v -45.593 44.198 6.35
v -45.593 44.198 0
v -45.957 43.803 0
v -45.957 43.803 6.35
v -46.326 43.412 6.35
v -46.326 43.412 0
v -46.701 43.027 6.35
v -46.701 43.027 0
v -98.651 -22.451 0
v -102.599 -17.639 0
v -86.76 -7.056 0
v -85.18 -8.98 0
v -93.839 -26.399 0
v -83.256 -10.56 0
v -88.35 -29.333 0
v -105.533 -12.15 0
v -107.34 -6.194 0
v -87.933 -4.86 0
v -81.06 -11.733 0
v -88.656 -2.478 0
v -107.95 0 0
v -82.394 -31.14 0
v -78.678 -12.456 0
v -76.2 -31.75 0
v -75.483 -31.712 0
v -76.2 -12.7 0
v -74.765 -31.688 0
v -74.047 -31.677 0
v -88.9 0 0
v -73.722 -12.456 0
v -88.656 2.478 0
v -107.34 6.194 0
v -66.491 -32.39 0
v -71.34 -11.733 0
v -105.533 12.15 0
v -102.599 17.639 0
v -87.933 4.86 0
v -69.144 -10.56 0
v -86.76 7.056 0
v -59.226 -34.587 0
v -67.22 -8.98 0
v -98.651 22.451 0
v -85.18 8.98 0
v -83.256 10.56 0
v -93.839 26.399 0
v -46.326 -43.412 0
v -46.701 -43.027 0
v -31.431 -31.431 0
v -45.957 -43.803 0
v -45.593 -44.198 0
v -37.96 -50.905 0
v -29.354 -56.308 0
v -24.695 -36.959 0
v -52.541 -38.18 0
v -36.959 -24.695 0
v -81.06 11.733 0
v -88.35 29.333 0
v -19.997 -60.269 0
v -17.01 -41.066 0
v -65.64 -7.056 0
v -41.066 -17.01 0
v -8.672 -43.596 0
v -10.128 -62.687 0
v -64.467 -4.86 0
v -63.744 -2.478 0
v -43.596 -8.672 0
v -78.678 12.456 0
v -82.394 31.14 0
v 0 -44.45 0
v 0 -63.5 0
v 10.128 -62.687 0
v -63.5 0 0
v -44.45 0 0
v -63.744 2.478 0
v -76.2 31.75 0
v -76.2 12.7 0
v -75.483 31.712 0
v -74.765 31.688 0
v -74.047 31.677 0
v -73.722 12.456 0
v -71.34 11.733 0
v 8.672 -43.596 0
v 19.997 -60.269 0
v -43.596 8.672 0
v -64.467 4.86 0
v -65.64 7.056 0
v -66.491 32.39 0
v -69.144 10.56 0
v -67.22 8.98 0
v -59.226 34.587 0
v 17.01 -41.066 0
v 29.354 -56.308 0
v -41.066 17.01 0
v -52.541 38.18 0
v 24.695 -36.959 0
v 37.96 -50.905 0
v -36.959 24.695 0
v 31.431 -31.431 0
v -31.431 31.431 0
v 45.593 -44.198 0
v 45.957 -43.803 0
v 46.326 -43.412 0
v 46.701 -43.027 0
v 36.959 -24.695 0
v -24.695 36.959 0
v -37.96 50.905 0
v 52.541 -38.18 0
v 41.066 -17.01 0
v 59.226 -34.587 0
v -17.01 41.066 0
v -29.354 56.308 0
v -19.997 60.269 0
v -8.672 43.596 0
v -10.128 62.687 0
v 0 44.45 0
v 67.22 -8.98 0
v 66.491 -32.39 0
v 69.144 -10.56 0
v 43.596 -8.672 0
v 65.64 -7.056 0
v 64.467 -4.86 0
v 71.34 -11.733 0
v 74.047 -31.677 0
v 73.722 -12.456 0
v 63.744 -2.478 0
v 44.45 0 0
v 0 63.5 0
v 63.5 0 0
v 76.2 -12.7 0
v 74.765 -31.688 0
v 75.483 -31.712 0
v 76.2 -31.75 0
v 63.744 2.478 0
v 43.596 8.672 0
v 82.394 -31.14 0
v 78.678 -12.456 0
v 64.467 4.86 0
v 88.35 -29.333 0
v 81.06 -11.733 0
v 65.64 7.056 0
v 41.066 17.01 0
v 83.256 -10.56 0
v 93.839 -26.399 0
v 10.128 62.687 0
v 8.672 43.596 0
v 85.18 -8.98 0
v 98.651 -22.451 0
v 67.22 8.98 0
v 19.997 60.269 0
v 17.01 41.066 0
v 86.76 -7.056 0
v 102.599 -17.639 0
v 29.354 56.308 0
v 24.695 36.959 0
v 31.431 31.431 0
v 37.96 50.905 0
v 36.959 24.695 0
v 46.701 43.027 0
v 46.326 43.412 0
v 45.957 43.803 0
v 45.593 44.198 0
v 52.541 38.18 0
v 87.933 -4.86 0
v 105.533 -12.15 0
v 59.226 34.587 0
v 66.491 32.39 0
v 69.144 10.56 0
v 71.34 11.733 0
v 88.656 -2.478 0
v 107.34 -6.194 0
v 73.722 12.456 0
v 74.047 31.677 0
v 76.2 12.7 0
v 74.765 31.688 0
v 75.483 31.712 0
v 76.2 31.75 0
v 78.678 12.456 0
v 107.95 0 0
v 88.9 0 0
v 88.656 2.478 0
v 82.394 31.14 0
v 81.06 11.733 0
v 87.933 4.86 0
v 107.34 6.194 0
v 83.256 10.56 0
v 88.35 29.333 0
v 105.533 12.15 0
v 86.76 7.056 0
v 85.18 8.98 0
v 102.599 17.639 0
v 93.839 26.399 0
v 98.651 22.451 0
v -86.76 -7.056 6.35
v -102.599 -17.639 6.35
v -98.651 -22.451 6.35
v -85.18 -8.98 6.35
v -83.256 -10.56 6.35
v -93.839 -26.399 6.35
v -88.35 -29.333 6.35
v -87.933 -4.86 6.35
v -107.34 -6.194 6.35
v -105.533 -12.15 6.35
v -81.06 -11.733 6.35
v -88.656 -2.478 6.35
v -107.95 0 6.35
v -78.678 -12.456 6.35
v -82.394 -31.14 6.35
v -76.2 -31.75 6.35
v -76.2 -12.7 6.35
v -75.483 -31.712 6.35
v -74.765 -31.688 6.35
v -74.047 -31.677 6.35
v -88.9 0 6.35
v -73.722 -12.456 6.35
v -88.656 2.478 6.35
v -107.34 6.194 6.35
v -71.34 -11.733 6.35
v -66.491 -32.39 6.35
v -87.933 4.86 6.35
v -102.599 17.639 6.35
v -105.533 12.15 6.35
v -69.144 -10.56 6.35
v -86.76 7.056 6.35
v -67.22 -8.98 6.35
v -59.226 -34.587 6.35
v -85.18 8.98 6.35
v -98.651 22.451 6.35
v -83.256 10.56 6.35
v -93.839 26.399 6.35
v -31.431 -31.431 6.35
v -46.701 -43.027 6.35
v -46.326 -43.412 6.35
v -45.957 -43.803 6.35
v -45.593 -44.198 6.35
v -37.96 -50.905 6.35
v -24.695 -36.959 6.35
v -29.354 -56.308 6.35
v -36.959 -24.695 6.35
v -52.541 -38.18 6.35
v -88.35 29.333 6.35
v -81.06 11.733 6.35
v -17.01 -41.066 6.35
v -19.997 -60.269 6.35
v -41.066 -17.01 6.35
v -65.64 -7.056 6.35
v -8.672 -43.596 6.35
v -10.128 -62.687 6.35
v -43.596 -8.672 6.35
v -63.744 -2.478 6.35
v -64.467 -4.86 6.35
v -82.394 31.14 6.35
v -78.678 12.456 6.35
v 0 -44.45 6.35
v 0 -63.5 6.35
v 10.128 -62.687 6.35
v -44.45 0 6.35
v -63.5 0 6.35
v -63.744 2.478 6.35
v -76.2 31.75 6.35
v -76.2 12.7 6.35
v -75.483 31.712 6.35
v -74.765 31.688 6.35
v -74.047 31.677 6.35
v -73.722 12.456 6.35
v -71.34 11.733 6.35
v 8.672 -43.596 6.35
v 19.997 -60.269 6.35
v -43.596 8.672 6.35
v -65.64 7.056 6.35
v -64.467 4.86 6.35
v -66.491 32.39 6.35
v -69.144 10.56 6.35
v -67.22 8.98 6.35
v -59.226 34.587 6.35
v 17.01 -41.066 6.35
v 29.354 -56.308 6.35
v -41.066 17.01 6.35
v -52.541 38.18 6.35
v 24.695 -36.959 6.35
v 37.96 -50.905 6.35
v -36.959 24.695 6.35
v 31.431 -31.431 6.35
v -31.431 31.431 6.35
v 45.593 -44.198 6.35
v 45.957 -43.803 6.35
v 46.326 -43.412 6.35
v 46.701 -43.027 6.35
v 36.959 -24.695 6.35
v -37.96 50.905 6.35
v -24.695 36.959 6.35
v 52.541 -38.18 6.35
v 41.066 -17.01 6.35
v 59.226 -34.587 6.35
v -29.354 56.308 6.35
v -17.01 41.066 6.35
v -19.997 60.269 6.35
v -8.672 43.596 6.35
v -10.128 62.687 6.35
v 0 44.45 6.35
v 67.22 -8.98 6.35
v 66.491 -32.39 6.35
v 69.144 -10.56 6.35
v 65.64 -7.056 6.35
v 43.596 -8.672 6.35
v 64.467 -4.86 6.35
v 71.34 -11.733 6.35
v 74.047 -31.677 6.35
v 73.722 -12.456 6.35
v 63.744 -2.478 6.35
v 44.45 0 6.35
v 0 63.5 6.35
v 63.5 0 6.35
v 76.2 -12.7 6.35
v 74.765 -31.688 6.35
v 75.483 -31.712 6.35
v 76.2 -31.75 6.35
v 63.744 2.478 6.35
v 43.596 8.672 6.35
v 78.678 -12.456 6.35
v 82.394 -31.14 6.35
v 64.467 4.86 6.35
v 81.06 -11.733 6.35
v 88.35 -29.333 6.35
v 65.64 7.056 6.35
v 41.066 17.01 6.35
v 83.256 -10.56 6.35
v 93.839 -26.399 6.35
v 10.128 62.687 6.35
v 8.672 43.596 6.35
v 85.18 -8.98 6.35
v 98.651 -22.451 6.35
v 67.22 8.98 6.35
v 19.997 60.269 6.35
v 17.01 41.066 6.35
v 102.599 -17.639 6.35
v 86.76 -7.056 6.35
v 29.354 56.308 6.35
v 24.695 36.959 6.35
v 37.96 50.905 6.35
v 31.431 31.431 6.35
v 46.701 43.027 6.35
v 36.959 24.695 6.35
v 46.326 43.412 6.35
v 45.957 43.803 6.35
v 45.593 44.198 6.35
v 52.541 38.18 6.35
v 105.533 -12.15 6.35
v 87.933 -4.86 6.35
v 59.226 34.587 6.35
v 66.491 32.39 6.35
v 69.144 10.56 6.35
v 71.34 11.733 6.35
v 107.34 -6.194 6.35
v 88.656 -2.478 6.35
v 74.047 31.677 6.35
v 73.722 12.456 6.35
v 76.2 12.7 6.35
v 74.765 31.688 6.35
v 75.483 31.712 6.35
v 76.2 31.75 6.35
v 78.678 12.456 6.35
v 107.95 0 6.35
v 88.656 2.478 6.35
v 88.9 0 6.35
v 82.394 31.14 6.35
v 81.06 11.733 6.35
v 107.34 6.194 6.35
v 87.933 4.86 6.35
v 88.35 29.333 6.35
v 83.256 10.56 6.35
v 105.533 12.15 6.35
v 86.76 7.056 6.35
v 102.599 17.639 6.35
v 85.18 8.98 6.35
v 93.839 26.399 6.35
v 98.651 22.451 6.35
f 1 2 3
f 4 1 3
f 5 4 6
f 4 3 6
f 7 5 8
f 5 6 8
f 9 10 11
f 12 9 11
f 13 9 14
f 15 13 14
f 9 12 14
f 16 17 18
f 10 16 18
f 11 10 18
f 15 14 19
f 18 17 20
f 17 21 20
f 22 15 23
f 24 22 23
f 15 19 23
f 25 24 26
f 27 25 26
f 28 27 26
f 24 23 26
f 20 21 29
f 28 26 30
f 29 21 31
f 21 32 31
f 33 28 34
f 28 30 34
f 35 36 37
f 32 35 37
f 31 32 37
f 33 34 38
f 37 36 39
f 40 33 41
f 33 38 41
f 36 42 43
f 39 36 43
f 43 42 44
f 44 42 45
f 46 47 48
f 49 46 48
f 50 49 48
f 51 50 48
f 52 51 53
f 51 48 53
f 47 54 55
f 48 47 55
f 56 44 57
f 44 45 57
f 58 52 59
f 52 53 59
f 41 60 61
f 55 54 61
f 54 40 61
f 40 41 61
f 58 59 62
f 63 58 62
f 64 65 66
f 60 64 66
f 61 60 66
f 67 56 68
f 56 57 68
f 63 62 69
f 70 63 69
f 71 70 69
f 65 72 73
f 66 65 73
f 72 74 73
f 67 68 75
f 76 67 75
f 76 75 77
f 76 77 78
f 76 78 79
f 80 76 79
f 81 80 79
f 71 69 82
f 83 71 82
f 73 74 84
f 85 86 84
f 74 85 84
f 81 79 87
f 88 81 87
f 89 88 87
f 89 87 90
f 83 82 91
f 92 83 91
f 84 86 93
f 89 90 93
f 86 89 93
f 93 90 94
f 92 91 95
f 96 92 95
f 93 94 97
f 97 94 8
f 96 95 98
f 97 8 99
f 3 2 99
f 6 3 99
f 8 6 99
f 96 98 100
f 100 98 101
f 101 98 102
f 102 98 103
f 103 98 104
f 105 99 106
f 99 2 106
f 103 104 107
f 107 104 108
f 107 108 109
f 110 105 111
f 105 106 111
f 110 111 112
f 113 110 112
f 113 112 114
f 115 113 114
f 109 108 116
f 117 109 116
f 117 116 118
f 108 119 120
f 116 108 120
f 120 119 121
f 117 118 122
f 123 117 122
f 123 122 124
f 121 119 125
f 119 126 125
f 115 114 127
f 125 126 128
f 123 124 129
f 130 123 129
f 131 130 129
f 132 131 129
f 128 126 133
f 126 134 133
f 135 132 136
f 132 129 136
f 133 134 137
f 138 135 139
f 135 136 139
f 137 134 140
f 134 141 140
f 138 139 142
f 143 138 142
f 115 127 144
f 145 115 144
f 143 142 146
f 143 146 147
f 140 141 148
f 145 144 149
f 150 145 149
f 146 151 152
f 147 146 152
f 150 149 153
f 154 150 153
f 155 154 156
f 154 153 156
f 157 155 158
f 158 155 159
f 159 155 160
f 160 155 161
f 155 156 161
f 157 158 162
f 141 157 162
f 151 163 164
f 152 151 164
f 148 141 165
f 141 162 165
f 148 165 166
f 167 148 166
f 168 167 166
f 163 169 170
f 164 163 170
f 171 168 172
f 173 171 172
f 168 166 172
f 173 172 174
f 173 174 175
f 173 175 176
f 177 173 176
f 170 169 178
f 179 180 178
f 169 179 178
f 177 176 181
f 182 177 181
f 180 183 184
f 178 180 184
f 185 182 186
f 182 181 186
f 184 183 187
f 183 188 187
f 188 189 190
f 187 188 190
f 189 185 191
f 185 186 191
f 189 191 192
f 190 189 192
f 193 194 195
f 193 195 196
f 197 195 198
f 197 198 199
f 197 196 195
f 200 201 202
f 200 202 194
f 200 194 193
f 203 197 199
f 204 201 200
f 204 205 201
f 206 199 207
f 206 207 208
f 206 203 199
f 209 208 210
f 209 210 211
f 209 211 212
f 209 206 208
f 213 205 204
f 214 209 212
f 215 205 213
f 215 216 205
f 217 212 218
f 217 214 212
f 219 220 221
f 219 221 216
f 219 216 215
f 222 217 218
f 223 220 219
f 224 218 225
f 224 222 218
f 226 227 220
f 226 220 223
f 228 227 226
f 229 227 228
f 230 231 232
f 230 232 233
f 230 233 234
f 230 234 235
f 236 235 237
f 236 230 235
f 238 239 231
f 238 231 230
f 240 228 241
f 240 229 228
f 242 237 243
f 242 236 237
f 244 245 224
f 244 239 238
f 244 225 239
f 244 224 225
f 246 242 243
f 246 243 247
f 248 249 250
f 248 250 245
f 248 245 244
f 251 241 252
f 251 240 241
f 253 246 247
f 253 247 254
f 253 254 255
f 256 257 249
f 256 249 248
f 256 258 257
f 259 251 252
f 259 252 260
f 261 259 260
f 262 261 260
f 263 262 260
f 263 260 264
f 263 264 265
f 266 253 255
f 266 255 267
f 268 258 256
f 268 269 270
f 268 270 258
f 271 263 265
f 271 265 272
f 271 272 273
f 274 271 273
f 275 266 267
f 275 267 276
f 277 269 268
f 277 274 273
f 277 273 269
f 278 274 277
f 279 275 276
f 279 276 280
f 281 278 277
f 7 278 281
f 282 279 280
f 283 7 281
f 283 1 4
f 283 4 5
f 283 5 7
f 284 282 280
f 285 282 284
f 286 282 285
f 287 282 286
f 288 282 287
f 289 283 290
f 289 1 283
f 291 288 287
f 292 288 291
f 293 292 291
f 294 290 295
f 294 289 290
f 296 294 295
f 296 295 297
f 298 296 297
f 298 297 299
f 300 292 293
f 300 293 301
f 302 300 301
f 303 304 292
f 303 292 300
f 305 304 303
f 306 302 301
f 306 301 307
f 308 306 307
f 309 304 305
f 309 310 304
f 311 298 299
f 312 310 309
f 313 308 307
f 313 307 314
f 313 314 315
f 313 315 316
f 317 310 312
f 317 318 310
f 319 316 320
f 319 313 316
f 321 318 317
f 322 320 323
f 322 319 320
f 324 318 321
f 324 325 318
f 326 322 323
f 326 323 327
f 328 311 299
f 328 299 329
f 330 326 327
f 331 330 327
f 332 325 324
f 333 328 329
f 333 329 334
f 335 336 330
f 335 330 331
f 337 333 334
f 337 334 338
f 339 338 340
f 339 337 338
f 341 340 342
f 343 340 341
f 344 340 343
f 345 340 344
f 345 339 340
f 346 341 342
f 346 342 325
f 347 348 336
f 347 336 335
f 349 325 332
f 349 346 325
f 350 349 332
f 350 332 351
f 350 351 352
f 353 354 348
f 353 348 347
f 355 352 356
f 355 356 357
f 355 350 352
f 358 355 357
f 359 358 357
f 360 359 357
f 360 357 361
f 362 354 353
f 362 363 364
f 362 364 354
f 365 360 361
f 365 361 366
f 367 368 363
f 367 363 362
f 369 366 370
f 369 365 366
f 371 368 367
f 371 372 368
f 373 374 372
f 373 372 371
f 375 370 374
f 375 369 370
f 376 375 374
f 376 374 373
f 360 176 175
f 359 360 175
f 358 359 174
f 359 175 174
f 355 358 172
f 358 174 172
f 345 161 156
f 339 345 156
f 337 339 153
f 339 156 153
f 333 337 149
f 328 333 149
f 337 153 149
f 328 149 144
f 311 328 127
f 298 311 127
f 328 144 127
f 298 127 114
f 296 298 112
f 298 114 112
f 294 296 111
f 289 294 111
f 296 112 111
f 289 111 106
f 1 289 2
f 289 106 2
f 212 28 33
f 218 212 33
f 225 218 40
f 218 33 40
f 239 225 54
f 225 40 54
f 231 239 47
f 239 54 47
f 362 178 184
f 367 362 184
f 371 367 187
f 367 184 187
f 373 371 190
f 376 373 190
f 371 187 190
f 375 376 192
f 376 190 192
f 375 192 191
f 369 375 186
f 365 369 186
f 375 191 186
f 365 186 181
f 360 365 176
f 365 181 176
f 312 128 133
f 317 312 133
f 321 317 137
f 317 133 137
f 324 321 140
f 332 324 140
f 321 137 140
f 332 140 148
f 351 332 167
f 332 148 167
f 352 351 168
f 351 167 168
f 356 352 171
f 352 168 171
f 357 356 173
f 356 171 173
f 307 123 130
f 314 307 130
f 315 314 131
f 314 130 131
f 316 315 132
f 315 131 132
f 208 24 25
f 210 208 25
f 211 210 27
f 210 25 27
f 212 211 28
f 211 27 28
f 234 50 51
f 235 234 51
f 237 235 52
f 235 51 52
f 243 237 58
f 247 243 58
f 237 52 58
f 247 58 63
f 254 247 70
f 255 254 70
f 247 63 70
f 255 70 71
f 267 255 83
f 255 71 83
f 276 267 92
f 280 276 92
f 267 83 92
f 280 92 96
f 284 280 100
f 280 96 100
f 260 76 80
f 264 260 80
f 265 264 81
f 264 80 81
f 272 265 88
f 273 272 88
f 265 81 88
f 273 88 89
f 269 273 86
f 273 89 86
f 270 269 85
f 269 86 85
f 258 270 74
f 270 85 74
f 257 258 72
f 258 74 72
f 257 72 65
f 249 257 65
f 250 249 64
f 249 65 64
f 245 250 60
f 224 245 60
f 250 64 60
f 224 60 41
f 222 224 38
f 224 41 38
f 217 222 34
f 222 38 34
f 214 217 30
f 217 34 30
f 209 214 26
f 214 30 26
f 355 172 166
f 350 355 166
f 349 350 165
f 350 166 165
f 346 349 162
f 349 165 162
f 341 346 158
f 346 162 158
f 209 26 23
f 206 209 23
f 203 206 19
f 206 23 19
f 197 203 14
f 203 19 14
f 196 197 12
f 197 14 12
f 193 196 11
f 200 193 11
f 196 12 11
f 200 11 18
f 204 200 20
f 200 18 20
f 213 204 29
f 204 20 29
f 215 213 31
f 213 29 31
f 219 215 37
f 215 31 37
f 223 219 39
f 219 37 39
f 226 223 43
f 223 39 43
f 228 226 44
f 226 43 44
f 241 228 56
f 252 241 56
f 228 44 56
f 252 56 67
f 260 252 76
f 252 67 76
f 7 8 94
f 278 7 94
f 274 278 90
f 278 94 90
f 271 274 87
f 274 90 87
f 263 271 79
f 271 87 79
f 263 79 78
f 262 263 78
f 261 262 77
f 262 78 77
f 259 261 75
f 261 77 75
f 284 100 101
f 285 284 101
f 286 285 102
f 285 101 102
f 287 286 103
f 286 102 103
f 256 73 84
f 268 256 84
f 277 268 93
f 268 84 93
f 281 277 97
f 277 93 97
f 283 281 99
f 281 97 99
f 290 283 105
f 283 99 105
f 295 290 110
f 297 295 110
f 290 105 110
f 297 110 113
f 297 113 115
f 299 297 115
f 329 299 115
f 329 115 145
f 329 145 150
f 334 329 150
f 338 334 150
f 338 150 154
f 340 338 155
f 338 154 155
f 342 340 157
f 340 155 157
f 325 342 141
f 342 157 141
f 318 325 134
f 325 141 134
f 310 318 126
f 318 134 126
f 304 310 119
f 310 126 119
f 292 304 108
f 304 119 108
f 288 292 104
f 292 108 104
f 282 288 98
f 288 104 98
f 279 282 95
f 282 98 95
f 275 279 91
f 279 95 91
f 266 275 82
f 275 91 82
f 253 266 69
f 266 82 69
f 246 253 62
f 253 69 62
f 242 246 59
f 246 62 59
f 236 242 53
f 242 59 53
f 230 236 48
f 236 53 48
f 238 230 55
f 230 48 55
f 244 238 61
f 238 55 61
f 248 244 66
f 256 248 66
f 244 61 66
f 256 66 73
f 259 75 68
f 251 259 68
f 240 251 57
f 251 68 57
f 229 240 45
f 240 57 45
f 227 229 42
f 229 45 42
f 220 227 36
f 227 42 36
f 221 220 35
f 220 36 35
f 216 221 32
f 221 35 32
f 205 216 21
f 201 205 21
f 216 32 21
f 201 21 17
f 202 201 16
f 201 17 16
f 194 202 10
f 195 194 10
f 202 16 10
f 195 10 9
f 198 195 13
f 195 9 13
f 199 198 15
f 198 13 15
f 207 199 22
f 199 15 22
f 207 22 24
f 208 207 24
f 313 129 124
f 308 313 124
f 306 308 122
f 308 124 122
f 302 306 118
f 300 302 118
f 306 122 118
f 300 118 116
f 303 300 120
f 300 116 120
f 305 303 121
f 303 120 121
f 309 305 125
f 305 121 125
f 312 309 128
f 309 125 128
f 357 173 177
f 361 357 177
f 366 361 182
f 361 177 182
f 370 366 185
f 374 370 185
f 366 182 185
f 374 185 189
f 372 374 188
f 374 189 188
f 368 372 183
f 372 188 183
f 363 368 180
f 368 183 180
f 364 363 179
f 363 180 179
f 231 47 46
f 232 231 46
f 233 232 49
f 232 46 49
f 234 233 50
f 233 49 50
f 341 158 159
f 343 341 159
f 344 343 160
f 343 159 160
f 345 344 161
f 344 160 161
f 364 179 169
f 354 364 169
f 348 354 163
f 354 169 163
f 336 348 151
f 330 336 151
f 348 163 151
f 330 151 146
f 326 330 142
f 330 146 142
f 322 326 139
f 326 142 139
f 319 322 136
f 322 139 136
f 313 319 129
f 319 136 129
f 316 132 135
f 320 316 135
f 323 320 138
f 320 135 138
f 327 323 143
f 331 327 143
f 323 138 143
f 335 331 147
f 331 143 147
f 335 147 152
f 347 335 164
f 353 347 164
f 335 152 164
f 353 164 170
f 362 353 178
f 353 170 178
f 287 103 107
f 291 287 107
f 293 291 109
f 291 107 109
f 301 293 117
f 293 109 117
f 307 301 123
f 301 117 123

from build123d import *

# Parameters (mm, degrees)
F1_DEPTH = 6.35


with BuildPart() as f1:
    # F0 (on Top) → F1 (new body)
    with BuildSketch(Plane.XY):
        with BuildLine():
            ThreePointArc((57.94375, -25.976370723), (48.024670033, -14.636026826), (44.45, 0))
            ThreePointArc((44.45, 0), (0, -44.45), (-44.45, 0))
            ThreePointArc((-44.45, 0), (-48.024670033, -14.636026826), (-57.94375, -25.976370723))
            ThreePointArc((-57.94375, -25.976370723), (-53.0122296555, -34.9564515783), (-46.7007710297, -43.0265962543))
            ThreePointArc((-46.7007710297, -43.0265962543), (-46.1408199964, -43.6066686624), (-45.5932687094, -44.1984597966))
            ThreePointArc((-45.5932687094, -44.1984597966), (0, -63.5), (45.5932687094, -44.1984597966))
            ThreePointArc((45.5932687094, -44.1984597966), (46.1408199964, -43.6066686624), (46.7007710297, -43.0265962543))
            ThreePointArc((46.7007710297, -43.0265962543), (53.0122296555, -34.9564515783), (57.94375, -25.976370723))
        make_face()
        with BuildLine():
            ThreePointArc((57.94375, 25.976370723), (48.024670033, 14.636026826), (44.45, 0))
            Line((44.45, 0), (63.5, 0))
            ThreePointArc((63.5, 0), (62.0954029096, 13.2819779212), (57.94375, 25.976370723))
        make_face()
        with BuildLine():
            ThreePointArc((-44.45, 0), (0, 44.45), (44.45, 0))
            ThreePointArc((44.45, 0), (48.024670033, 14.636026826), (57.94375, 25.976370723))
            ThreePointArc((57.94375, 25.976370723), (53.0122296555, 34.9564515783), (46.7007710297, 43.0265962543))
            ThreePointArc((46.7007710297, 43.0265962543), (46.1408199964, 43.6066686624), (45.5932687094, 44.1984597966))
            ThreePointArc((45.5932687094, 44.1984597966), (0, 63.5), (-45.5932687094, 44.1984597966))
            ThreePointArc((-45.5932687094, 44.1984597966), (-46.1408199964, 43.6066686624), (-46.7007710297, 43.0265962543))
            ThreePointArc((-46.7007710297, 43.0265962543), (-53.0122296555, 34.9564515783), (-57.94375, 25.976370723))
            ThreePointArc((-57.94375, 25.976370723), (-48.024670033, 14.636026826), (-44.45, 0))
        make_face()
        with BuildLine():
            Line((63.5, 0), (44.45, 0))
            ThreePointArc((44.45, 0), (48.024670033, -14.636026826), (57.94375, -25.976370723))
            ThreePointArc((57.94375, -25.976370723), (62.0954029096, -13.2819779212), (63.5, 0))
        make_face()
        with BuildLine():
            ThreePointArc((-57.94375, -25.976370723), (-48.024670033, -14.636026826), (-44.45, 0))
            Line((-44.45, 0), (-63.5, 0))
            ThreePointArc((-63.5, 0), (-62.0954029096, -13.2819779212), (-57.94375, -25.976370723))
        make_face()
        with BuildLine():
            Line((-63.5, 0), (-44.45, 0))
            ThreePointArc((-44.45, 0), (-48.024670033, 14.636026826), (-57.94375, 25.976370723))
            ThreePointArc((-57.94375, 25.976370723), (-62.0954029096, 13.2819779212), (-63.5, 0))
        make_face()
        with BuildLine():
            ThreePointArc((76.2, -12.7), (67.2197438789, -8.9802561211), (63.5, 0))
            ThreePointArc((63.5, 0), (62.0954029096, -13.2819779212), (57.94375, -25.976370723))
            ThreePointArc((57.94375, -25.976370723), (65.6047024614, -29.9299543947), (74.0468101417, -31.6769044168))
            ThreePointArc((74.0468101417, -31.6769044168), (75.1239218386, -31.6982296864), (76.2, -31.75))
            Line((76.2, -31.75), (76.2, -12.7))
        make_face()
        with BuildLine():
            ThreePointArc((57.94375, 25.976370723), (62.0954029096, 13.2819779212), (63.5, 0))
            ThreePointArc((63.5, 0), (67.2197438789, 8.9802561211), (76.2, 12.7))
            Line((76.2, 12.7), (76.2, 31.75))
            ThreePointArc((76.2, 31.75), (75.1239218386, 31.6982296864), (74.0468101417, 31.6769044168))
            ThreePointArc((74.0468101417, 31.6769044168), (65.6047024614, 29.9299543947), (57.94375, 25.976370723))
        make_face()
        with BuildLine():
            ThreePointArc((46.7007710297, 43.0265962543), (53.0122296555, 34.9564515783), (57.94375, 25.976370723))
            ThreePointArc((57.94375, 25.976370723), (65.6047024614, 29.9299543947), (74.0468101417, 31.6769044168))
            ThreePointArc((74.0468101417, 31.6769044168), (59.2262146143, 34.5867715285), (46.7007710297, 43.0265962543))
        make_face()
        with BuildLine():
            ThreePointArc((74.0468101417, -31.6769044168), (65.6047024614, -29.9299543947), (57.94375, -25.976370723))
            ThreePointArc((57.94375, -25.976370723), (53.0122296555, -34.9564515783), (46.7007710297, -43.0265962543))
            ThreePointArc((46.7007710297, -43.0265962543), (59.2262146143, -34.5867715285), (74.0468101417, -31.6769044168))
        make_face()
        with BuildLine():
            ThreePointArc((-76.2, 12.7), (-67.2197438789, 8.9802561211), (-63.5, 0))
            ThreePointArc((-63.5, 0), (-62.0954029096, 13.2819779212), (-57.94375, 25.976370723))
            ThreePointArc((-57.94375, 25.976370723), (-65.6047024614, 29.9299543947), (-74.0468101417, 31.6769044168))
            ThreePointArc((-74.0468101417, 31.6769044168), (-75.1239218386, 31.6982296864), (-76.2, 31.75))
            Line((-76.2, 31.75), (-76.2, 12.7))
        make_face()
        with BuildLine():
            ThreePointArc((-57.94375, -25.976370723), (-62.0954029096, -13.2819779212), (-63.5, 0))
            ThreePointArc((-63.5, 0), (-67.2197438789, -8.9802561211), (-76.2, -12.7))
            Line((-76.2, -12.7), (-76.2, -31.75))
            ThreePointArc((-76.2, -31.75), (-75.1239218386, -31.6982296864), (-74.0468101417, -31.6769044168))
            ThreePointArc((-74.0468101417, -31.6769044168), (-65.6047024614, -29.9299543947), (-57.94375, -25.976370723))
        make_face()
        with BuildLine():
            ThreePointArc((-74.0468101417, 31.6769044168), (-65.6047024614, 29.9299543947), (-57.94375, 25.976370723))
            ThreePointArc((-57.94375, 25.976370723), (-53.0122296555, 34.9564515783), (-46.7007710297, 43.0265962543))
            ThreePointArc((-46.7007710297, 43.0265962543), (-59.2262146143, 34.5867715285), (-74.0468101417, 31.6769044168))
        make_face()
        with BuildLine():
            ThreePointArc((-46.7007710297, -43.0265962543), (-53.0122296555, -34.9564515783), (-57.94375, -25.976370723))
            ThreePointArc((-57.94375, -25.976370723), (-65.6047024614, -29.9299543947), (-74.0468101417, -31.6769044168))
            ThreePointArc((-74.0468101417, -31.6769044168), (-59.2262146143, -34.5867715285), (-46.7007710297, -43.0265962543))
        make_face()
        with BuildLine():
            Line((76.2, 31.75), (76.2, 12.7))
            ThreePointArc((76.2, 12.7), (85.1802561211, 8.9802561211), (88.9, 0))
            ThreePointArc((88.9, 0), (85.1802561211, -8.9802561211), (76.2, -12.7))
            Line((76.2, -12.7), (76.2, -31.75))
            ThreePointArc((76.2, -31.75), (98.6506403027, -22.4506403027), (107.95, 0))
            ThreePointArc((107.95, 0), (98.6506403027, 22.4506403027), (76.2, 31.75))
        make_face()
        with BuildLine():
            ThreePointArc((-76.2, -12.7), (-88.9, 0), (-76.2, 12.7))
            Line((-76.2, 12.7), (-76.2, 31.75))
            ThreePointArc((-76.2, 31.75), (-107.95, 0), (-76.2, -31.75))
            Line((-76.2, -31.75), (-76.2, -12.7))
        make_face()
    extrude(amount=F1_DEPTH)


solid = f1.part
